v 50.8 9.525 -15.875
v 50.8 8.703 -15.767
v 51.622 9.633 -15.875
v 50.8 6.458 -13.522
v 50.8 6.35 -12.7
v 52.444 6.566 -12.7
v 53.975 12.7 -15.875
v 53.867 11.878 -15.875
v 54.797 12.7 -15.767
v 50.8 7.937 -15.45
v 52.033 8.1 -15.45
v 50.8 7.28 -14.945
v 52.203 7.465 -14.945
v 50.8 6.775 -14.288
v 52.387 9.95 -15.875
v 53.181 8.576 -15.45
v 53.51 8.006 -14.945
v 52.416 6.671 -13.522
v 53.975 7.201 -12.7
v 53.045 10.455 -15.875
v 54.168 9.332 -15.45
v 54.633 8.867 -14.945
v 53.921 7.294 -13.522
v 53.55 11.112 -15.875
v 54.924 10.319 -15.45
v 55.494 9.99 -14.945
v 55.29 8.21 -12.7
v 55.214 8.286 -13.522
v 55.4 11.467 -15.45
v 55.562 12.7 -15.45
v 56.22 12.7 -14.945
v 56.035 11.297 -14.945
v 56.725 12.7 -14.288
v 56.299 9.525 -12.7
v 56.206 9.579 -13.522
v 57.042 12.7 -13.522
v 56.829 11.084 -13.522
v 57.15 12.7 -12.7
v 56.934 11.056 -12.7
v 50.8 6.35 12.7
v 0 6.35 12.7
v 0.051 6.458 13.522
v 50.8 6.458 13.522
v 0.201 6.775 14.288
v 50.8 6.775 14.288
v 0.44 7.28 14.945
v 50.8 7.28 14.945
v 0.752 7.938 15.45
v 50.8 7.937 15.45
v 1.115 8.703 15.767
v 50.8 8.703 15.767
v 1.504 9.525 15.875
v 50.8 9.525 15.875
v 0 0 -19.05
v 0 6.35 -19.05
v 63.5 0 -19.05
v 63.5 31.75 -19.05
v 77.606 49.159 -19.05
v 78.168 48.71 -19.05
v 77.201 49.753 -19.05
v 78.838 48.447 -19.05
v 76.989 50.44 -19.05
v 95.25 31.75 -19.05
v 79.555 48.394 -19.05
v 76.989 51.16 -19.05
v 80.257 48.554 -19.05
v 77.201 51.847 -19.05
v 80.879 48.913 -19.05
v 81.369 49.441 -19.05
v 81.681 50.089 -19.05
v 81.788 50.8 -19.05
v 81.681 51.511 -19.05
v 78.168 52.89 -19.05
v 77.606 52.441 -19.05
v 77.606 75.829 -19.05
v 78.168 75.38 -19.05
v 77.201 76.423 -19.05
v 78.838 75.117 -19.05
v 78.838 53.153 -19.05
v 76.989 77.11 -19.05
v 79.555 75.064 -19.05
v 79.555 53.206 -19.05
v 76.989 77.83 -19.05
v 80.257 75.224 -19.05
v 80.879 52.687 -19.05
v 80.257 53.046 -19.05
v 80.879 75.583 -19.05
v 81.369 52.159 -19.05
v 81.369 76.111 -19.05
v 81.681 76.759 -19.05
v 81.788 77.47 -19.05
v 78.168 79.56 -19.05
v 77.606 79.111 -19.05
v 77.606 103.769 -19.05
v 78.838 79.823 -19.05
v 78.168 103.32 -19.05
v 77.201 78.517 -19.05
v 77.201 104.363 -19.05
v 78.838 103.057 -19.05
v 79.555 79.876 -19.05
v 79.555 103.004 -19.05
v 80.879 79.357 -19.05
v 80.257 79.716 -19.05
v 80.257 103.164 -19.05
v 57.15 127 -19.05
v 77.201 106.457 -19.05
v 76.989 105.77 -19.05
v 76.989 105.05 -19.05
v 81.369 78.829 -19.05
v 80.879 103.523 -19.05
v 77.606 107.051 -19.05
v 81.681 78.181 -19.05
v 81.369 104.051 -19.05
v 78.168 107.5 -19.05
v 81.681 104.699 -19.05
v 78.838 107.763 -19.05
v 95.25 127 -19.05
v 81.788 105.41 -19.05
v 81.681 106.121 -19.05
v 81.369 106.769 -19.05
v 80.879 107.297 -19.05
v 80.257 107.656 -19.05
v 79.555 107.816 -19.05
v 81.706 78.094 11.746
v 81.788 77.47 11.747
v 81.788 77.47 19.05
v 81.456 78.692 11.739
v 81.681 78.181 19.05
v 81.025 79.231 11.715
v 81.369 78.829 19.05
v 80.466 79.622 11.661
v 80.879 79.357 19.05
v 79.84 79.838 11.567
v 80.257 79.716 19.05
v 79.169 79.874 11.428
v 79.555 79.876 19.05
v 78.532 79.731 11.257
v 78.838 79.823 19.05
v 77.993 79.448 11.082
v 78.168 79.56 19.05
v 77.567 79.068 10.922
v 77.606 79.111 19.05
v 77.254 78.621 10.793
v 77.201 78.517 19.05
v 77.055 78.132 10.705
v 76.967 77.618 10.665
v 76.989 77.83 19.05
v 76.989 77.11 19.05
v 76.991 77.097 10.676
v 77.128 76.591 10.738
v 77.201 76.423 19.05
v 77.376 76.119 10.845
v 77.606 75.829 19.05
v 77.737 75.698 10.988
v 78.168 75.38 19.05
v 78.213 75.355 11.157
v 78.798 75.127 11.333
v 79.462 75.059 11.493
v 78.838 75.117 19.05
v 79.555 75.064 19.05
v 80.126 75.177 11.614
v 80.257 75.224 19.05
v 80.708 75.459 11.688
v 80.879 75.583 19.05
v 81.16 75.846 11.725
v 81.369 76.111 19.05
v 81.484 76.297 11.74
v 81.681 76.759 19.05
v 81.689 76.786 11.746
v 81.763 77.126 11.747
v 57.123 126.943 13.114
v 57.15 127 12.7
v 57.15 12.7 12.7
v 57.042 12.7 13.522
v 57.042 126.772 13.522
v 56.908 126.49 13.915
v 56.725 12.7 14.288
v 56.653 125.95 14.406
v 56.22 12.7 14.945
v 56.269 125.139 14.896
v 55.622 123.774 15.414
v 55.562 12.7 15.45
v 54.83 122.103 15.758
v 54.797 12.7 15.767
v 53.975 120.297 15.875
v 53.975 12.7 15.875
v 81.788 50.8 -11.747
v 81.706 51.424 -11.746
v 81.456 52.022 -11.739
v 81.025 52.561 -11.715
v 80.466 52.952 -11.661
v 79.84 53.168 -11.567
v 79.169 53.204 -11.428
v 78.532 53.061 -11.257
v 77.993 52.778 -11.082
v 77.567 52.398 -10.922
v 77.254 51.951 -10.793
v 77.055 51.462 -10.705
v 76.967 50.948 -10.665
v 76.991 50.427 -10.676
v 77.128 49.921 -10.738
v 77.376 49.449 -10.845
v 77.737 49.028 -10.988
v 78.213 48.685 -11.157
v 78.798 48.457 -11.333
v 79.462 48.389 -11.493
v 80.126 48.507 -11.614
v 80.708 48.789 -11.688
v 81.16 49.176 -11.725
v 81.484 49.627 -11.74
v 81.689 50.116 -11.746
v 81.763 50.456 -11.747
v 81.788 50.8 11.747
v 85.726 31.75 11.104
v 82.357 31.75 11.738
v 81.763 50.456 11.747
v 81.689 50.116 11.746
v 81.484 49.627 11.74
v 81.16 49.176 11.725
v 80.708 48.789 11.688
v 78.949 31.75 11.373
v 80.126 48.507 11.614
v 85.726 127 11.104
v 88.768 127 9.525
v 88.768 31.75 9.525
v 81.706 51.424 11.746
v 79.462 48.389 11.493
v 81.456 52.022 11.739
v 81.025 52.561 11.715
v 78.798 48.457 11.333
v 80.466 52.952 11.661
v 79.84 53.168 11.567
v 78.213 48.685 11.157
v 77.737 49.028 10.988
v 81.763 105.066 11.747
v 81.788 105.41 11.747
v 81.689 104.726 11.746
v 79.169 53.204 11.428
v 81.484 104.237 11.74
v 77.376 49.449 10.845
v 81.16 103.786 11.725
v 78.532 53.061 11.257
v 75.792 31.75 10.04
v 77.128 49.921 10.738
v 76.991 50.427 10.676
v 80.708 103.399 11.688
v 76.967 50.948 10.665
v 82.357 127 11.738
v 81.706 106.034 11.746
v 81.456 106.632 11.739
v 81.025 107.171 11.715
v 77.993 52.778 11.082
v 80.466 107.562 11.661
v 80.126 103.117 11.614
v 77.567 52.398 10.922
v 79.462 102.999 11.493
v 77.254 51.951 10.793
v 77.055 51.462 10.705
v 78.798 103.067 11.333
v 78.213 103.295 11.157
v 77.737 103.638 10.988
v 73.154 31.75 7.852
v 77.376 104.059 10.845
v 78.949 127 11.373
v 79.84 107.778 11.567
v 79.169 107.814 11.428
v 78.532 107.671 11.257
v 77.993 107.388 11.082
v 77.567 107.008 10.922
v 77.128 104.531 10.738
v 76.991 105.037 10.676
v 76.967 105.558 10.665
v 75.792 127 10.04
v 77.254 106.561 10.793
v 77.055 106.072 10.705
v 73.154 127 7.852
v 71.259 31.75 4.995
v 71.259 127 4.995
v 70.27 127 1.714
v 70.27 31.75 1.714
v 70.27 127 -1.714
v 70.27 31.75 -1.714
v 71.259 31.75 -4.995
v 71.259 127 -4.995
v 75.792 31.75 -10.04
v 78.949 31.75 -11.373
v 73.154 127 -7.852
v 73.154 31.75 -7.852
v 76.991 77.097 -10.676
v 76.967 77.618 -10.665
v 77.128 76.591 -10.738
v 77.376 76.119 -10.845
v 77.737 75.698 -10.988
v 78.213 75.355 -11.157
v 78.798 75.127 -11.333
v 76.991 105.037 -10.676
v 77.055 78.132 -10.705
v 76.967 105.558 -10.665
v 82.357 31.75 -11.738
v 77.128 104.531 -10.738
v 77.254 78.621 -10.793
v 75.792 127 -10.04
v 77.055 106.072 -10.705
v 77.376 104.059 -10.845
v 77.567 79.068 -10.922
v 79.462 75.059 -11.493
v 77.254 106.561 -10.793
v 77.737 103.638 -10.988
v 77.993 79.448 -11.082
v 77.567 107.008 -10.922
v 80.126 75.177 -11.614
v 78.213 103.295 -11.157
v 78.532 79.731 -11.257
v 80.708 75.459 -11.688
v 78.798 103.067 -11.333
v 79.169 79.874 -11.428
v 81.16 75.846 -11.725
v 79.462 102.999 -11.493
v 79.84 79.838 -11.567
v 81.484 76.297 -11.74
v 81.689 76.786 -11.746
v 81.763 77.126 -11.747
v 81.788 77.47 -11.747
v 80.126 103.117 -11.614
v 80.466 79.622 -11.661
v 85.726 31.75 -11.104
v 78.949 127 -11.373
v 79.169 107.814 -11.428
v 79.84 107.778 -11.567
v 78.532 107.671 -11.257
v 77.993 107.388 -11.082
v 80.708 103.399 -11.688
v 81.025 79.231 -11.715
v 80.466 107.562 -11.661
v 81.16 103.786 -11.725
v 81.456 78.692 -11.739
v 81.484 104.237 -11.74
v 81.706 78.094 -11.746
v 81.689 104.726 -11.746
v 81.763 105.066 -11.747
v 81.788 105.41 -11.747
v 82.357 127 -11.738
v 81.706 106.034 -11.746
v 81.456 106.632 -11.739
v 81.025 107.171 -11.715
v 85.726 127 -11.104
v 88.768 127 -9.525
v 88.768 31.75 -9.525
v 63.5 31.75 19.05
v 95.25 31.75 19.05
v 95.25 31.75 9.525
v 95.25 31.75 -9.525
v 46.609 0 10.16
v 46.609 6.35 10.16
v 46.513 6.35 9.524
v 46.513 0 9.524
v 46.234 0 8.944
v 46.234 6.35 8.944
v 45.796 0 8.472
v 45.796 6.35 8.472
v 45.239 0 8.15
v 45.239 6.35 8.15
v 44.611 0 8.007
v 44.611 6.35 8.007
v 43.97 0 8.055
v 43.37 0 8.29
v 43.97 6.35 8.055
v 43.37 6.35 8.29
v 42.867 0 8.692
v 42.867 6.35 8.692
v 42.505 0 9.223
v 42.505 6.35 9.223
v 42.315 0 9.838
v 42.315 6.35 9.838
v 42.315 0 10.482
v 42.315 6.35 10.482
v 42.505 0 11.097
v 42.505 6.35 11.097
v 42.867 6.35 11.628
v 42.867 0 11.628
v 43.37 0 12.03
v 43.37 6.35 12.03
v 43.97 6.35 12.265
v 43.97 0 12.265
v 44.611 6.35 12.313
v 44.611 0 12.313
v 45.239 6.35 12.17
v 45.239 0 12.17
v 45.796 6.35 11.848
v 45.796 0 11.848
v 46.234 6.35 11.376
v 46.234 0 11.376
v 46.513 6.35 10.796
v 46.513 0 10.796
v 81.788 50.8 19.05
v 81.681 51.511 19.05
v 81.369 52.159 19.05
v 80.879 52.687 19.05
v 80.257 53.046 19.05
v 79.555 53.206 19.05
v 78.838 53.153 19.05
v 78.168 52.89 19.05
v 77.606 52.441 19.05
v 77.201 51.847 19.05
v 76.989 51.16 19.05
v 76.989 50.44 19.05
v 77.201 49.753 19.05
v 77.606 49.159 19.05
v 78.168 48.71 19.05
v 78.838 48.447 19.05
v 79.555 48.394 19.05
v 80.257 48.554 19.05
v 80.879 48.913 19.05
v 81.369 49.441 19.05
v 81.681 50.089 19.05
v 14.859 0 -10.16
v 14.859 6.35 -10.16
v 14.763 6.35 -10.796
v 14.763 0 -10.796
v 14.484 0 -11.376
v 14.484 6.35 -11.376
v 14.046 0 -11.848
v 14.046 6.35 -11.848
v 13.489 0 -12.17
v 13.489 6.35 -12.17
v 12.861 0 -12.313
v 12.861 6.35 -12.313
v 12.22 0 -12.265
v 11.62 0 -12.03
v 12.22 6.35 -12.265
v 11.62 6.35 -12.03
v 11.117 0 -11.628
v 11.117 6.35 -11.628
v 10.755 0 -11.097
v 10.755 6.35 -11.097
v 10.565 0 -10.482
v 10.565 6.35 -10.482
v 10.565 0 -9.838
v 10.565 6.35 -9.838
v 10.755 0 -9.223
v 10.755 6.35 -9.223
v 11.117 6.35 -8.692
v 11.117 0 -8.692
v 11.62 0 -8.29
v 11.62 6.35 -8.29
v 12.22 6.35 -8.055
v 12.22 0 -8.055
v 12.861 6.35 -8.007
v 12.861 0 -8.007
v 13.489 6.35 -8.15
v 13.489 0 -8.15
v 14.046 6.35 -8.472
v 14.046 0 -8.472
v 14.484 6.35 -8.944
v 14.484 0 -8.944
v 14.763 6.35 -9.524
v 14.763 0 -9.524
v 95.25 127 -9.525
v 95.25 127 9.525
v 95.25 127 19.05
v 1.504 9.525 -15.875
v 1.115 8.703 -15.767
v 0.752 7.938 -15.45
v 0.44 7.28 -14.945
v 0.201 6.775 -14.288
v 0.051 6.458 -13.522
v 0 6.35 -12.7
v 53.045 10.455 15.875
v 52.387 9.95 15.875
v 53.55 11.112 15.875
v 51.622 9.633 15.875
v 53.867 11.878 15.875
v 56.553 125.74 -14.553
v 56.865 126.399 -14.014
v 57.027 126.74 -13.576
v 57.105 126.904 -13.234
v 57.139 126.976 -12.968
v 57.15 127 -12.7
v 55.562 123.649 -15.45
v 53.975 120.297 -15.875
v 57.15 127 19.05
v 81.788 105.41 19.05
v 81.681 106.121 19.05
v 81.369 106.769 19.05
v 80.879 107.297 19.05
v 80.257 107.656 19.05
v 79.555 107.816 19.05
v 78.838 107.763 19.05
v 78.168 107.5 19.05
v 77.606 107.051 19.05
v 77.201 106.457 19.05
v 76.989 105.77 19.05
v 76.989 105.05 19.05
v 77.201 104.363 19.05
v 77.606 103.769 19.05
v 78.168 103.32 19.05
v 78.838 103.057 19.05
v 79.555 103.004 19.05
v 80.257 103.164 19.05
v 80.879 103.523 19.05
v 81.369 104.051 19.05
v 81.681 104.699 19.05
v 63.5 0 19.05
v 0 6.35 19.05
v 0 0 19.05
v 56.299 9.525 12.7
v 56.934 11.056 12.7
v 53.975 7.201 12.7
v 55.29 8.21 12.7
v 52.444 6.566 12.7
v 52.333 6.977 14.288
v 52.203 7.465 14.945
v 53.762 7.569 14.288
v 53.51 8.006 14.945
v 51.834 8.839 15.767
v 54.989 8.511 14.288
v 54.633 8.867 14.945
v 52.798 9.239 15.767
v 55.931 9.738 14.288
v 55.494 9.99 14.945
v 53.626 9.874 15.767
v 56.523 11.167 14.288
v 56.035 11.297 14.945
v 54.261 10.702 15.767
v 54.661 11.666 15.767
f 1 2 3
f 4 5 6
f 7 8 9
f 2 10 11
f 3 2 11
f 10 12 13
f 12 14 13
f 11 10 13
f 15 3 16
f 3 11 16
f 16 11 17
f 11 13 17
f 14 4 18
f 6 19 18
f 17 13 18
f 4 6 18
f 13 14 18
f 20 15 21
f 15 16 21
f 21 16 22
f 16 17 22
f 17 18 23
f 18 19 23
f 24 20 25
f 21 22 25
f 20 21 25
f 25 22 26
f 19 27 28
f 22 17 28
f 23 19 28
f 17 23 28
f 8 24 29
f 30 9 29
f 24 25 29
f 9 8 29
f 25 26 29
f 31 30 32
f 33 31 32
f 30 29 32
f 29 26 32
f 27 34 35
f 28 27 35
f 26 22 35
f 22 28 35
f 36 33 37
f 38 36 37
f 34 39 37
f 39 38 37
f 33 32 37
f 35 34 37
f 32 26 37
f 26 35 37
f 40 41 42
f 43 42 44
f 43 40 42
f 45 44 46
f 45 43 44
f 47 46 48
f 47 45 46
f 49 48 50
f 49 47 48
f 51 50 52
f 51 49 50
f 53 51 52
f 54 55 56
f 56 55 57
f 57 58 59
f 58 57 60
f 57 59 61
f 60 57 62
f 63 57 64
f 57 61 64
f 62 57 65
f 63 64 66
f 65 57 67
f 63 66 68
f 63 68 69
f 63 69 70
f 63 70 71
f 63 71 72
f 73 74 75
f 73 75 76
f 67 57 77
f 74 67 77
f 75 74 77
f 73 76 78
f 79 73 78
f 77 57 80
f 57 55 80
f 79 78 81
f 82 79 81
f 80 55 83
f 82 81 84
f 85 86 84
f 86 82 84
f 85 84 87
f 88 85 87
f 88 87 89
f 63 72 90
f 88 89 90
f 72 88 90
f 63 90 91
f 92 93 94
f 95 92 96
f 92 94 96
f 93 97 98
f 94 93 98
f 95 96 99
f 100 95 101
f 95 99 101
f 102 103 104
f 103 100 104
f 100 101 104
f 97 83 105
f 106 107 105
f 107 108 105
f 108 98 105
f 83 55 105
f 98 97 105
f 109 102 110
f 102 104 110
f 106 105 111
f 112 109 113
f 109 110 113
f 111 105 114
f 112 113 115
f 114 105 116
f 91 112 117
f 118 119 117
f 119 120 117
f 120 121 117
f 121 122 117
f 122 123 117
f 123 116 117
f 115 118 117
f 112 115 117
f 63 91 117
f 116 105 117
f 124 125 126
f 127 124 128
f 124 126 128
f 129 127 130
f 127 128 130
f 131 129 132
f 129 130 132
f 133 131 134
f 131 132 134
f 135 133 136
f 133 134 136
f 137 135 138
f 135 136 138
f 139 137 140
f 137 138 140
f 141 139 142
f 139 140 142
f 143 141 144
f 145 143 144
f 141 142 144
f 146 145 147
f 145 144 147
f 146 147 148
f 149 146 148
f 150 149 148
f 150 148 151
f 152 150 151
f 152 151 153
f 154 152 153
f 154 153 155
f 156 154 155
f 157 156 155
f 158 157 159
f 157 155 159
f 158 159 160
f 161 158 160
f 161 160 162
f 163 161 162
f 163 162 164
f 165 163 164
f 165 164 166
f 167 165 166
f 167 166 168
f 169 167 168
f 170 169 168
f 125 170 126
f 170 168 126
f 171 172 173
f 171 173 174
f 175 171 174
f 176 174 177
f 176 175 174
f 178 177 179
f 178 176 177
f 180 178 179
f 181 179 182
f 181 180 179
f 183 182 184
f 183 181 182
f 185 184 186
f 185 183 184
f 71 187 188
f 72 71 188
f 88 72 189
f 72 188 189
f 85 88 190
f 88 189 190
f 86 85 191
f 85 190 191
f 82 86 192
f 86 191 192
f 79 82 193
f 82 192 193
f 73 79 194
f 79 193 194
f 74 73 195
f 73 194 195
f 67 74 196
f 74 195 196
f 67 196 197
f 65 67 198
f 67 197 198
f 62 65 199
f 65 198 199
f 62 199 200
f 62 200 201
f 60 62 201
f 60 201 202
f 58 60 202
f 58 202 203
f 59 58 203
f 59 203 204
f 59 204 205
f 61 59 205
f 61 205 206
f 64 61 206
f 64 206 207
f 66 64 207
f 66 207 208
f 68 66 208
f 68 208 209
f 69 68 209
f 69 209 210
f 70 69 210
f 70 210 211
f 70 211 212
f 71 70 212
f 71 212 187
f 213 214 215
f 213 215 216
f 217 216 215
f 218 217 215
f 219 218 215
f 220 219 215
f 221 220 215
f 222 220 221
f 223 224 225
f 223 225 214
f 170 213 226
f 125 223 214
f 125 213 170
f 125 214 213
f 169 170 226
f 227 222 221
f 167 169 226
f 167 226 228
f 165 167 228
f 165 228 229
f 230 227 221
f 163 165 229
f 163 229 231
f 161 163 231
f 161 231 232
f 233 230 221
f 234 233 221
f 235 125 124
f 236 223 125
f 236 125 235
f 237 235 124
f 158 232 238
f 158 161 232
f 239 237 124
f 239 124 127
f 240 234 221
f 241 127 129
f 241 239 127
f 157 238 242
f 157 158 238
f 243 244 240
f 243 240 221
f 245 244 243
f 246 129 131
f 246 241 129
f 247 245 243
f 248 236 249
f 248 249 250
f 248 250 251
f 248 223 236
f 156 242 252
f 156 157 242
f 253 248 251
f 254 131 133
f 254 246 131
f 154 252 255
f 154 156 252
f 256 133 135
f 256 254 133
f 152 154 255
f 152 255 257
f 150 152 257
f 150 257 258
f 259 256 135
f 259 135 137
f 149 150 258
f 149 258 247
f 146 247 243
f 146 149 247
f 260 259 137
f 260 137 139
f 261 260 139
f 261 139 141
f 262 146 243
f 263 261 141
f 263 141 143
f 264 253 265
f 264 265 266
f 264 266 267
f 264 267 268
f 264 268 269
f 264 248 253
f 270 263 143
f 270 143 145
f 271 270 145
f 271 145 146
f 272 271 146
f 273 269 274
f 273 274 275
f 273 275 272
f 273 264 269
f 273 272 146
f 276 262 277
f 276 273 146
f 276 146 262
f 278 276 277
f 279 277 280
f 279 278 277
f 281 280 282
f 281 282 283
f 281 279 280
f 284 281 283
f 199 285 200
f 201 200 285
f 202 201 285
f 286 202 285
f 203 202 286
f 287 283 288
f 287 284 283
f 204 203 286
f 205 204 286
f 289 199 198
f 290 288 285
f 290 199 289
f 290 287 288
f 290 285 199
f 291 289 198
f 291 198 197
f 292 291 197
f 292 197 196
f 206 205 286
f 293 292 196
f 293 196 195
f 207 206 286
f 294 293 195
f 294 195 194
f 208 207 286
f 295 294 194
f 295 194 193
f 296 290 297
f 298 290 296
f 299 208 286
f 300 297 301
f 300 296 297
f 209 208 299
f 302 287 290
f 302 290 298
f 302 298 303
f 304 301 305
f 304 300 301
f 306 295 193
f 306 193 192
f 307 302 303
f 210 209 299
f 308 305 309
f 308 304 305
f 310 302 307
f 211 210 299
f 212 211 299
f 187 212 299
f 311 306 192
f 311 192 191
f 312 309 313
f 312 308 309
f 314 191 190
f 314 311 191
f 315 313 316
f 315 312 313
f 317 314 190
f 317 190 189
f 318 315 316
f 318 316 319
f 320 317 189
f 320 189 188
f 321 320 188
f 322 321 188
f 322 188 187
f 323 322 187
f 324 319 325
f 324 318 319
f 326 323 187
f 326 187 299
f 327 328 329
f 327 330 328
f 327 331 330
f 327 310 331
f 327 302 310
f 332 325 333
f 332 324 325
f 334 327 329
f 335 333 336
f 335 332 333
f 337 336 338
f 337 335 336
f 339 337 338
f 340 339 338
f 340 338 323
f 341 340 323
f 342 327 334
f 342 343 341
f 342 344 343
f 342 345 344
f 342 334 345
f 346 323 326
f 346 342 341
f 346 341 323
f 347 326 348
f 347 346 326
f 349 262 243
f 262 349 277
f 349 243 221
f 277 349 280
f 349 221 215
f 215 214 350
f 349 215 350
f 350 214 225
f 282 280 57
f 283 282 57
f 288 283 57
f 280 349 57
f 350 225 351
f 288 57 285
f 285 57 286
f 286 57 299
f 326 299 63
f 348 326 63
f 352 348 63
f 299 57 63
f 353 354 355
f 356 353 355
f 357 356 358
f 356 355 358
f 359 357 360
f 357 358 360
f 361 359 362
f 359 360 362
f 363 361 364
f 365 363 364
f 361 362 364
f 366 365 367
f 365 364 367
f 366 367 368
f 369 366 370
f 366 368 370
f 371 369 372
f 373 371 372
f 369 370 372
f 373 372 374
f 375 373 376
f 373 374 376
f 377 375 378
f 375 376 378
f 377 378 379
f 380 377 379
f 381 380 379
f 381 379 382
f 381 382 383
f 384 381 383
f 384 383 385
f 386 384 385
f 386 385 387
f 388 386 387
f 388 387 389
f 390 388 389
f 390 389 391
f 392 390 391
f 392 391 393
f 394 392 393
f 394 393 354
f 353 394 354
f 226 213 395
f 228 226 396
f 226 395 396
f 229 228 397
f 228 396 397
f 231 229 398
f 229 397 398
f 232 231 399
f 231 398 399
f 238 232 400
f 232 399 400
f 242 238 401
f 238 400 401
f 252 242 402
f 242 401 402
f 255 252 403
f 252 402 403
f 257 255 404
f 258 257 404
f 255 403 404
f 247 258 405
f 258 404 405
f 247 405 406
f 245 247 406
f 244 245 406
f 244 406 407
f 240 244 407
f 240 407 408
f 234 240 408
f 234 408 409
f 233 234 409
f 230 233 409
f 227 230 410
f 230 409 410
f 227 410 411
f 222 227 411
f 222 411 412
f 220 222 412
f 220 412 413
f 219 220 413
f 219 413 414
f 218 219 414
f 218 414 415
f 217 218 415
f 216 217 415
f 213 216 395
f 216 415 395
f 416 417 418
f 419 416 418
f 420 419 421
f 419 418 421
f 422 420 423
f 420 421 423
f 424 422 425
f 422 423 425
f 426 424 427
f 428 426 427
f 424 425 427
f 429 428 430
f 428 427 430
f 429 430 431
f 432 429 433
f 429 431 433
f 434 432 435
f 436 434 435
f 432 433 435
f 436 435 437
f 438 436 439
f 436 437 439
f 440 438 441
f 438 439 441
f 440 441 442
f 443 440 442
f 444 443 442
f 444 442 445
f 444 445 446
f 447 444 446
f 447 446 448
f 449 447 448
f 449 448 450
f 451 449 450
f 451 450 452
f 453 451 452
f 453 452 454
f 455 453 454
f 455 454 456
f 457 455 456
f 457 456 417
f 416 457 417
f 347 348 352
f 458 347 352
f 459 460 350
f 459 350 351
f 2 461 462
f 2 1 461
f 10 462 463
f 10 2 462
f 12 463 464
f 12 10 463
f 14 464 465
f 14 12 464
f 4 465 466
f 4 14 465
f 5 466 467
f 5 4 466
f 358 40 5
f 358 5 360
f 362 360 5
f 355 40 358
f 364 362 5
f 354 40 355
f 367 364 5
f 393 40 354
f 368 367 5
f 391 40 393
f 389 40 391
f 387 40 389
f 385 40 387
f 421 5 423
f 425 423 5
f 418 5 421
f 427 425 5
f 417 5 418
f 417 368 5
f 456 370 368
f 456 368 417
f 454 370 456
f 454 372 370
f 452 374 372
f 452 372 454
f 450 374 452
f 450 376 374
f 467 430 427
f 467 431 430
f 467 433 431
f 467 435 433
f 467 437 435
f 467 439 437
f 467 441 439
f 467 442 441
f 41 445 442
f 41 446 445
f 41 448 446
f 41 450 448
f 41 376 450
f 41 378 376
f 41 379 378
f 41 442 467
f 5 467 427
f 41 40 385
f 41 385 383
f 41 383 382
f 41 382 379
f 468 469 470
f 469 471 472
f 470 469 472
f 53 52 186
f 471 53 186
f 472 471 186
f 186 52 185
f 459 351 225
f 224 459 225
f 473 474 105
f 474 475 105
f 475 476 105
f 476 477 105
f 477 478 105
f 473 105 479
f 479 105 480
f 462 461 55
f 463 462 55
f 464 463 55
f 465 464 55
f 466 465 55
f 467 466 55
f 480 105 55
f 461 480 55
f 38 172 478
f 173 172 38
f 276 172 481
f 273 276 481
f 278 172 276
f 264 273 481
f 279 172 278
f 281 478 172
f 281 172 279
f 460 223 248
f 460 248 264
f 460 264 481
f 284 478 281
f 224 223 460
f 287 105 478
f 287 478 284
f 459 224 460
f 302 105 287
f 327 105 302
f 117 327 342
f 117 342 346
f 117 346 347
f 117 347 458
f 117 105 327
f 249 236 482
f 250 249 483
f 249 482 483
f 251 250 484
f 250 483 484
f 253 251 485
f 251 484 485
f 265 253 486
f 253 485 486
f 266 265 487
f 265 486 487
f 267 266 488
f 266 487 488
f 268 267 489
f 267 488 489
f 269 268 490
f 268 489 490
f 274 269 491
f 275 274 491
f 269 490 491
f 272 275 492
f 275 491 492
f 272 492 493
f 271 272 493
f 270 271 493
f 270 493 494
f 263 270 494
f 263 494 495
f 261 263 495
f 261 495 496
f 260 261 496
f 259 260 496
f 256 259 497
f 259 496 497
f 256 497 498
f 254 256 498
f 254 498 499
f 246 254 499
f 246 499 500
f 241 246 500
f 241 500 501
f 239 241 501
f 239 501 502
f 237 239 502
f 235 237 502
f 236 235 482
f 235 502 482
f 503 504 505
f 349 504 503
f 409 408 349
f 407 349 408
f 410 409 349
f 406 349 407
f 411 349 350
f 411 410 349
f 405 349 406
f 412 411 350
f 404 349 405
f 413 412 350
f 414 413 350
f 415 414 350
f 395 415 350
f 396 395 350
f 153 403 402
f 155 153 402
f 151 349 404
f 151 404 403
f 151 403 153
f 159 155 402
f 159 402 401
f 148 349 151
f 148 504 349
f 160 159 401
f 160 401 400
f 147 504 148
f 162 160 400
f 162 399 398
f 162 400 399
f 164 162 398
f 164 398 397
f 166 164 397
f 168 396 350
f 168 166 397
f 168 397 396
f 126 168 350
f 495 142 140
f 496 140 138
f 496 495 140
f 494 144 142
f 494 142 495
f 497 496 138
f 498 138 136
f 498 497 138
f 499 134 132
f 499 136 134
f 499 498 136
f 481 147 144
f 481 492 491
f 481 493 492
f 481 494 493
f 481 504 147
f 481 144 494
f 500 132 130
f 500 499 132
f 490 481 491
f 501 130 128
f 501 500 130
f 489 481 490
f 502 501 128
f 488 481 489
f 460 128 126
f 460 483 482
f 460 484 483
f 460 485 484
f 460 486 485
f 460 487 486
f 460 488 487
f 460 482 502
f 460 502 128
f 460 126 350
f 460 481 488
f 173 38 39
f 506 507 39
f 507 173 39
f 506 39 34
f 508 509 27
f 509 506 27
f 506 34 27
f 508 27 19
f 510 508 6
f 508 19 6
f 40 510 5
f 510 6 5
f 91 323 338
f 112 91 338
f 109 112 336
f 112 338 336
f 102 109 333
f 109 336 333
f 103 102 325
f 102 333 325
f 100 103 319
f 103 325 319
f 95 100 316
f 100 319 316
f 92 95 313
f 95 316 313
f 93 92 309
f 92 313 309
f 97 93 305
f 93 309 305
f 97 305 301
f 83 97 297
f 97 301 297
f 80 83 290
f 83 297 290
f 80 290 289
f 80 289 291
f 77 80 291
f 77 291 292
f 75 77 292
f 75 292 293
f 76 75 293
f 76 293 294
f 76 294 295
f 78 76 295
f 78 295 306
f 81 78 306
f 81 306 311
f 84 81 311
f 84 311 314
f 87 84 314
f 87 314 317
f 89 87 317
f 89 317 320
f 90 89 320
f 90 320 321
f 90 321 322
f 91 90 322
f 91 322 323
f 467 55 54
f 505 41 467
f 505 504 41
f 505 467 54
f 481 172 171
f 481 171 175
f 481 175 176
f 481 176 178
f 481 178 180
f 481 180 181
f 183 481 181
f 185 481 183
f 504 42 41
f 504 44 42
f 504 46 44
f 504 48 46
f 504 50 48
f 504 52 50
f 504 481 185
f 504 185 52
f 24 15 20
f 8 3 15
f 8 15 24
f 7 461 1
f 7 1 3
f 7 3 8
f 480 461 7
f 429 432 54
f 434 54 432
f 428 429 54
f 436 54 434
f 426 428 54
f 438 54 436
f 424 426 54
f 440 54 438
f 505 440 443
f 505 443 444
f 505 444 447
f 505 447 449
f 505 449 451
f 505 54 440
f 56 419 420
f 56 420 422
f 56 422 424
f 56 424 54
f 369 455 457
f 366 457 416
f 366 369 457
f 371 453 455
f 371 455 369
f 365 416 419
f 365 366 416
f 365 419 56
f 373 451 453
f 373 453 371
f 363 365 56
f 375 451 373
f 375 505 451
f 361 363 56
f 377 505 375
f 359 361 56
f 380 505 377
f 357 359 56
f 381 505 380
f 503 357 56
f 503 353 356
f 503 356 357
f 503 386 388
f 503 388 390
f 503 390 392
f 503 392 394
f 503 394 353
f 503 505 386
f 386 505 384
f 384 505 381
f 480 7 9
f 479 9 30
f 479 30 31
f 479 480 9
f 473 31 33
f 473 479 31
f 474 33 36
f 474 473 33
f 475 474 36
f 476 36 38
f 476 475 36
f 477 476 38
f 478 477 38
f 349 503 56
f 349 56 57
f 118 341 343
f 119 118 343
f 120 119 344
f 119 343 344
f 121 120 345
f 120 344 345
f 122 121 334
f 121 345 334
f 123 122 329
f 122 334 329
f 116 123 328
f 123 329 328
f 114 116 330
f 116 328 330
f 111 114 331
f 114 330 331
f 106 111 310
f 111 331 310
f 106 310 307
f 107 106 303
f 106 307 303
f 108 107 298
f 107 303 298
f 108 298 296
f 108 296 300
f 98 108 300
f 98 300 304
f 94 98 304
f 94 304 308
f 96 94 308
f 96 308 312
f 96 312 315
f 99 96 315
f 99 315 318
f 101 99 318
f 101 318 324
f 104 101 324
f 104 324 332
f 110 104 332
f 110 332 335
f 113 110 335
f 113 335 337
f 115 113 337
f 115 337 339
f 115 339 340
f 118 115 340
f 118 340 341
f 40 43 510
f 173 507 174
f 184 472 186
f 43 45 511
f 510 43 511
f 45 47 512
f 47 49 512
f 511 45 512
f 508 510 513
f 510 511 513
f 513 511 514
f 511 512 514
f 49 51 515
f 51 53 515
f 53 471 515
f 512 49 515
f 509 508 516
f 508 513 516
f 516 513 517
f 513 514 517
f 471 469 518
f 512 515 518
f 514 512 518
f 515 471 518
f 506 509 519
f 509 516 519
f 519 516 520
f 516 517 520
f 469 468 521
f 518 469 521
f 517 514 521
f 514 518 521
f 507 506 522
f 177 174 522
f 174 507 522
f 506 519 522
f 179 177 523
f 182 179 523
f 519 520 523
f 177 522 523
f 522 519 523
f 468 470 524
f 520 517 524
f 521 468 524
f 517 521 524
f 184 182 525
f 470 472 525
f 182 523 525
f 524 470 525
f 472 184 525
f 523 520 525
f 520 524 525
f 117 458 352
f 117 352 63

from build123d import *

# Parameters (mm, degrees)
BOSS_EXTRUDE1_DEPTH     = 19.05
BOSS_EXTRUDE2_DEPTH     = 95.25
SKETCH4_R               = 2.413
CUT_EXTRUDE1_DEPTH      = 1
CUT_EXTRUDE1_DEPTH_BACK = 39.1
SKETCH5_R               = 2.159
CUT_EXTRUDE2_DEPTH      = 121.6500001
CUT_EXTRUDE2_DEPTH_BACK = 7.35
BOSS_EXTRUDE3_DEPTH     = 3.175
FILLET1_R               = 6.35
FILLET2_R               = 3.175


with BuildPart() as part:
    # Sketch1 → Boss-Extrude1 (new body, symmetric)
    with BuildSketch(Plane.XY):
        Polygon((0, 0), (63.5, 0), (63.5, 127), (57.15, 127), (57.15, 6.35), (0, 6.35), align=None)
    extrude(amount=BOSS_EXTRUDE1_DEPTH, both=True)

    # Sketch3 → Boss-Extrude2 (add)
    with BuildSketch(Plane(origin=(0, 127, 0), x_dir=(1, 0, 0), z_dir=(0, 1, 0))):
        with BuildLine():
            Line((95.25, 19.05), (63.5, 19.05))
            Line((63.5, 19.05), (63.5, -19.05))
            Line((63.5, -19.05), (95.25, -19.05))
            Line((95.25, -19.05), (95.25, -9.525))
            Line((95.25, -9.525), (88.767695047, -9.525))
            ThreePointArc((88.767695047, -9.525), (70.144285562, 0), (88.767695047, 9.525))
            Line((88.767695047, 9.525), (95.25, 9.525))
            Line((95.25, 9.525), (95.25, 19.05))
        make_face()
    extrude(amount=-BOSS_EXTRUDE2_DEPTH)

    # Sketch4 → Cut-Extrude1 (cut, two sides)
    with BuildSketch(Plane.XY.offset(19.05)) as cut_extrude1_sk:
        with Locations((79.375, 105.41)):
            Circle(SKETCH4_R)
        with Locations((79.375, 50.8)):
            Circle(SKETCH4_R)
        with Locations((79.375, 77.47)):
            Circle(SKETCH4_R)
    extrude(amount=CUT_EXTRUDE1_DEPTH, mode=Mode.SUBTRACT)
    extrude(cut_extrude1_sk.sketch, amount=-CUT_EXTRUDE1_DEPTH_BACK, mode=Mode.SUBTRACT)

    # Sketch5 → Cut-Extrude2 (cut, two sides)
    with BuildSketch(Plane(origin=(0, 6.35, 0), x_dir=(1, 0, 0), z_dir=(0, 1, 0))) as cut_extrude2_sk:
        with Locations((12.7, 10.16)):
            Circle(SKETCH5_R)
        with Locations((44.45, -10.16)):
            Circle(SKETCH5_R)
    extrude(amount=CUT_EXTRUDE2_DEPTH, mode=Mode.SUBTRACT)
    extrude(cut_extrude2_sk.sketch, amount=-CUT_EXTRUDE2_DEPTH_BACK, mode=Mode.SUBTRACT)

    # Sketch6 → Boss-Extrude3 (add)
    with BuildSketch(Plane.XY.offset(19.05)):
        Polygon((57.15, 127), (0, 6.35), (57.15, 6.35), align=None)
    boss_extrude3 = extrude(amount=-BOSS_EXTRUDE3_DEPTH)

    # Mirror1: Boss-Extrude3 across plane
    add(boss_extrude3.mirror(Plane.XY))

    # Fillet1
    fillet1_edges = [part.edges().sort_by_distance(p)[0] for p in [
        (57.15, 6.35, 0),
    ]]
    fillet(fillet1_edges, radius=FILLET1_R)

    # Fillet2
    fillet2_edges = [part.edges().sort_by_distance(p)[0] for p in [
        (25.4, 6.35, -15.875),
        (25.4, 6.35, 15.875),
        (55.290128061, 8.209871939, -15.875),
        (55.290128061, 8.209871939, 15.875),
        (57.15, 69.85, 15.875),
        (57.15, 69.85, -15.875),
    ]]
    fillet(fillet2_edges, radius=FILLET2_R)


solid = part.part
